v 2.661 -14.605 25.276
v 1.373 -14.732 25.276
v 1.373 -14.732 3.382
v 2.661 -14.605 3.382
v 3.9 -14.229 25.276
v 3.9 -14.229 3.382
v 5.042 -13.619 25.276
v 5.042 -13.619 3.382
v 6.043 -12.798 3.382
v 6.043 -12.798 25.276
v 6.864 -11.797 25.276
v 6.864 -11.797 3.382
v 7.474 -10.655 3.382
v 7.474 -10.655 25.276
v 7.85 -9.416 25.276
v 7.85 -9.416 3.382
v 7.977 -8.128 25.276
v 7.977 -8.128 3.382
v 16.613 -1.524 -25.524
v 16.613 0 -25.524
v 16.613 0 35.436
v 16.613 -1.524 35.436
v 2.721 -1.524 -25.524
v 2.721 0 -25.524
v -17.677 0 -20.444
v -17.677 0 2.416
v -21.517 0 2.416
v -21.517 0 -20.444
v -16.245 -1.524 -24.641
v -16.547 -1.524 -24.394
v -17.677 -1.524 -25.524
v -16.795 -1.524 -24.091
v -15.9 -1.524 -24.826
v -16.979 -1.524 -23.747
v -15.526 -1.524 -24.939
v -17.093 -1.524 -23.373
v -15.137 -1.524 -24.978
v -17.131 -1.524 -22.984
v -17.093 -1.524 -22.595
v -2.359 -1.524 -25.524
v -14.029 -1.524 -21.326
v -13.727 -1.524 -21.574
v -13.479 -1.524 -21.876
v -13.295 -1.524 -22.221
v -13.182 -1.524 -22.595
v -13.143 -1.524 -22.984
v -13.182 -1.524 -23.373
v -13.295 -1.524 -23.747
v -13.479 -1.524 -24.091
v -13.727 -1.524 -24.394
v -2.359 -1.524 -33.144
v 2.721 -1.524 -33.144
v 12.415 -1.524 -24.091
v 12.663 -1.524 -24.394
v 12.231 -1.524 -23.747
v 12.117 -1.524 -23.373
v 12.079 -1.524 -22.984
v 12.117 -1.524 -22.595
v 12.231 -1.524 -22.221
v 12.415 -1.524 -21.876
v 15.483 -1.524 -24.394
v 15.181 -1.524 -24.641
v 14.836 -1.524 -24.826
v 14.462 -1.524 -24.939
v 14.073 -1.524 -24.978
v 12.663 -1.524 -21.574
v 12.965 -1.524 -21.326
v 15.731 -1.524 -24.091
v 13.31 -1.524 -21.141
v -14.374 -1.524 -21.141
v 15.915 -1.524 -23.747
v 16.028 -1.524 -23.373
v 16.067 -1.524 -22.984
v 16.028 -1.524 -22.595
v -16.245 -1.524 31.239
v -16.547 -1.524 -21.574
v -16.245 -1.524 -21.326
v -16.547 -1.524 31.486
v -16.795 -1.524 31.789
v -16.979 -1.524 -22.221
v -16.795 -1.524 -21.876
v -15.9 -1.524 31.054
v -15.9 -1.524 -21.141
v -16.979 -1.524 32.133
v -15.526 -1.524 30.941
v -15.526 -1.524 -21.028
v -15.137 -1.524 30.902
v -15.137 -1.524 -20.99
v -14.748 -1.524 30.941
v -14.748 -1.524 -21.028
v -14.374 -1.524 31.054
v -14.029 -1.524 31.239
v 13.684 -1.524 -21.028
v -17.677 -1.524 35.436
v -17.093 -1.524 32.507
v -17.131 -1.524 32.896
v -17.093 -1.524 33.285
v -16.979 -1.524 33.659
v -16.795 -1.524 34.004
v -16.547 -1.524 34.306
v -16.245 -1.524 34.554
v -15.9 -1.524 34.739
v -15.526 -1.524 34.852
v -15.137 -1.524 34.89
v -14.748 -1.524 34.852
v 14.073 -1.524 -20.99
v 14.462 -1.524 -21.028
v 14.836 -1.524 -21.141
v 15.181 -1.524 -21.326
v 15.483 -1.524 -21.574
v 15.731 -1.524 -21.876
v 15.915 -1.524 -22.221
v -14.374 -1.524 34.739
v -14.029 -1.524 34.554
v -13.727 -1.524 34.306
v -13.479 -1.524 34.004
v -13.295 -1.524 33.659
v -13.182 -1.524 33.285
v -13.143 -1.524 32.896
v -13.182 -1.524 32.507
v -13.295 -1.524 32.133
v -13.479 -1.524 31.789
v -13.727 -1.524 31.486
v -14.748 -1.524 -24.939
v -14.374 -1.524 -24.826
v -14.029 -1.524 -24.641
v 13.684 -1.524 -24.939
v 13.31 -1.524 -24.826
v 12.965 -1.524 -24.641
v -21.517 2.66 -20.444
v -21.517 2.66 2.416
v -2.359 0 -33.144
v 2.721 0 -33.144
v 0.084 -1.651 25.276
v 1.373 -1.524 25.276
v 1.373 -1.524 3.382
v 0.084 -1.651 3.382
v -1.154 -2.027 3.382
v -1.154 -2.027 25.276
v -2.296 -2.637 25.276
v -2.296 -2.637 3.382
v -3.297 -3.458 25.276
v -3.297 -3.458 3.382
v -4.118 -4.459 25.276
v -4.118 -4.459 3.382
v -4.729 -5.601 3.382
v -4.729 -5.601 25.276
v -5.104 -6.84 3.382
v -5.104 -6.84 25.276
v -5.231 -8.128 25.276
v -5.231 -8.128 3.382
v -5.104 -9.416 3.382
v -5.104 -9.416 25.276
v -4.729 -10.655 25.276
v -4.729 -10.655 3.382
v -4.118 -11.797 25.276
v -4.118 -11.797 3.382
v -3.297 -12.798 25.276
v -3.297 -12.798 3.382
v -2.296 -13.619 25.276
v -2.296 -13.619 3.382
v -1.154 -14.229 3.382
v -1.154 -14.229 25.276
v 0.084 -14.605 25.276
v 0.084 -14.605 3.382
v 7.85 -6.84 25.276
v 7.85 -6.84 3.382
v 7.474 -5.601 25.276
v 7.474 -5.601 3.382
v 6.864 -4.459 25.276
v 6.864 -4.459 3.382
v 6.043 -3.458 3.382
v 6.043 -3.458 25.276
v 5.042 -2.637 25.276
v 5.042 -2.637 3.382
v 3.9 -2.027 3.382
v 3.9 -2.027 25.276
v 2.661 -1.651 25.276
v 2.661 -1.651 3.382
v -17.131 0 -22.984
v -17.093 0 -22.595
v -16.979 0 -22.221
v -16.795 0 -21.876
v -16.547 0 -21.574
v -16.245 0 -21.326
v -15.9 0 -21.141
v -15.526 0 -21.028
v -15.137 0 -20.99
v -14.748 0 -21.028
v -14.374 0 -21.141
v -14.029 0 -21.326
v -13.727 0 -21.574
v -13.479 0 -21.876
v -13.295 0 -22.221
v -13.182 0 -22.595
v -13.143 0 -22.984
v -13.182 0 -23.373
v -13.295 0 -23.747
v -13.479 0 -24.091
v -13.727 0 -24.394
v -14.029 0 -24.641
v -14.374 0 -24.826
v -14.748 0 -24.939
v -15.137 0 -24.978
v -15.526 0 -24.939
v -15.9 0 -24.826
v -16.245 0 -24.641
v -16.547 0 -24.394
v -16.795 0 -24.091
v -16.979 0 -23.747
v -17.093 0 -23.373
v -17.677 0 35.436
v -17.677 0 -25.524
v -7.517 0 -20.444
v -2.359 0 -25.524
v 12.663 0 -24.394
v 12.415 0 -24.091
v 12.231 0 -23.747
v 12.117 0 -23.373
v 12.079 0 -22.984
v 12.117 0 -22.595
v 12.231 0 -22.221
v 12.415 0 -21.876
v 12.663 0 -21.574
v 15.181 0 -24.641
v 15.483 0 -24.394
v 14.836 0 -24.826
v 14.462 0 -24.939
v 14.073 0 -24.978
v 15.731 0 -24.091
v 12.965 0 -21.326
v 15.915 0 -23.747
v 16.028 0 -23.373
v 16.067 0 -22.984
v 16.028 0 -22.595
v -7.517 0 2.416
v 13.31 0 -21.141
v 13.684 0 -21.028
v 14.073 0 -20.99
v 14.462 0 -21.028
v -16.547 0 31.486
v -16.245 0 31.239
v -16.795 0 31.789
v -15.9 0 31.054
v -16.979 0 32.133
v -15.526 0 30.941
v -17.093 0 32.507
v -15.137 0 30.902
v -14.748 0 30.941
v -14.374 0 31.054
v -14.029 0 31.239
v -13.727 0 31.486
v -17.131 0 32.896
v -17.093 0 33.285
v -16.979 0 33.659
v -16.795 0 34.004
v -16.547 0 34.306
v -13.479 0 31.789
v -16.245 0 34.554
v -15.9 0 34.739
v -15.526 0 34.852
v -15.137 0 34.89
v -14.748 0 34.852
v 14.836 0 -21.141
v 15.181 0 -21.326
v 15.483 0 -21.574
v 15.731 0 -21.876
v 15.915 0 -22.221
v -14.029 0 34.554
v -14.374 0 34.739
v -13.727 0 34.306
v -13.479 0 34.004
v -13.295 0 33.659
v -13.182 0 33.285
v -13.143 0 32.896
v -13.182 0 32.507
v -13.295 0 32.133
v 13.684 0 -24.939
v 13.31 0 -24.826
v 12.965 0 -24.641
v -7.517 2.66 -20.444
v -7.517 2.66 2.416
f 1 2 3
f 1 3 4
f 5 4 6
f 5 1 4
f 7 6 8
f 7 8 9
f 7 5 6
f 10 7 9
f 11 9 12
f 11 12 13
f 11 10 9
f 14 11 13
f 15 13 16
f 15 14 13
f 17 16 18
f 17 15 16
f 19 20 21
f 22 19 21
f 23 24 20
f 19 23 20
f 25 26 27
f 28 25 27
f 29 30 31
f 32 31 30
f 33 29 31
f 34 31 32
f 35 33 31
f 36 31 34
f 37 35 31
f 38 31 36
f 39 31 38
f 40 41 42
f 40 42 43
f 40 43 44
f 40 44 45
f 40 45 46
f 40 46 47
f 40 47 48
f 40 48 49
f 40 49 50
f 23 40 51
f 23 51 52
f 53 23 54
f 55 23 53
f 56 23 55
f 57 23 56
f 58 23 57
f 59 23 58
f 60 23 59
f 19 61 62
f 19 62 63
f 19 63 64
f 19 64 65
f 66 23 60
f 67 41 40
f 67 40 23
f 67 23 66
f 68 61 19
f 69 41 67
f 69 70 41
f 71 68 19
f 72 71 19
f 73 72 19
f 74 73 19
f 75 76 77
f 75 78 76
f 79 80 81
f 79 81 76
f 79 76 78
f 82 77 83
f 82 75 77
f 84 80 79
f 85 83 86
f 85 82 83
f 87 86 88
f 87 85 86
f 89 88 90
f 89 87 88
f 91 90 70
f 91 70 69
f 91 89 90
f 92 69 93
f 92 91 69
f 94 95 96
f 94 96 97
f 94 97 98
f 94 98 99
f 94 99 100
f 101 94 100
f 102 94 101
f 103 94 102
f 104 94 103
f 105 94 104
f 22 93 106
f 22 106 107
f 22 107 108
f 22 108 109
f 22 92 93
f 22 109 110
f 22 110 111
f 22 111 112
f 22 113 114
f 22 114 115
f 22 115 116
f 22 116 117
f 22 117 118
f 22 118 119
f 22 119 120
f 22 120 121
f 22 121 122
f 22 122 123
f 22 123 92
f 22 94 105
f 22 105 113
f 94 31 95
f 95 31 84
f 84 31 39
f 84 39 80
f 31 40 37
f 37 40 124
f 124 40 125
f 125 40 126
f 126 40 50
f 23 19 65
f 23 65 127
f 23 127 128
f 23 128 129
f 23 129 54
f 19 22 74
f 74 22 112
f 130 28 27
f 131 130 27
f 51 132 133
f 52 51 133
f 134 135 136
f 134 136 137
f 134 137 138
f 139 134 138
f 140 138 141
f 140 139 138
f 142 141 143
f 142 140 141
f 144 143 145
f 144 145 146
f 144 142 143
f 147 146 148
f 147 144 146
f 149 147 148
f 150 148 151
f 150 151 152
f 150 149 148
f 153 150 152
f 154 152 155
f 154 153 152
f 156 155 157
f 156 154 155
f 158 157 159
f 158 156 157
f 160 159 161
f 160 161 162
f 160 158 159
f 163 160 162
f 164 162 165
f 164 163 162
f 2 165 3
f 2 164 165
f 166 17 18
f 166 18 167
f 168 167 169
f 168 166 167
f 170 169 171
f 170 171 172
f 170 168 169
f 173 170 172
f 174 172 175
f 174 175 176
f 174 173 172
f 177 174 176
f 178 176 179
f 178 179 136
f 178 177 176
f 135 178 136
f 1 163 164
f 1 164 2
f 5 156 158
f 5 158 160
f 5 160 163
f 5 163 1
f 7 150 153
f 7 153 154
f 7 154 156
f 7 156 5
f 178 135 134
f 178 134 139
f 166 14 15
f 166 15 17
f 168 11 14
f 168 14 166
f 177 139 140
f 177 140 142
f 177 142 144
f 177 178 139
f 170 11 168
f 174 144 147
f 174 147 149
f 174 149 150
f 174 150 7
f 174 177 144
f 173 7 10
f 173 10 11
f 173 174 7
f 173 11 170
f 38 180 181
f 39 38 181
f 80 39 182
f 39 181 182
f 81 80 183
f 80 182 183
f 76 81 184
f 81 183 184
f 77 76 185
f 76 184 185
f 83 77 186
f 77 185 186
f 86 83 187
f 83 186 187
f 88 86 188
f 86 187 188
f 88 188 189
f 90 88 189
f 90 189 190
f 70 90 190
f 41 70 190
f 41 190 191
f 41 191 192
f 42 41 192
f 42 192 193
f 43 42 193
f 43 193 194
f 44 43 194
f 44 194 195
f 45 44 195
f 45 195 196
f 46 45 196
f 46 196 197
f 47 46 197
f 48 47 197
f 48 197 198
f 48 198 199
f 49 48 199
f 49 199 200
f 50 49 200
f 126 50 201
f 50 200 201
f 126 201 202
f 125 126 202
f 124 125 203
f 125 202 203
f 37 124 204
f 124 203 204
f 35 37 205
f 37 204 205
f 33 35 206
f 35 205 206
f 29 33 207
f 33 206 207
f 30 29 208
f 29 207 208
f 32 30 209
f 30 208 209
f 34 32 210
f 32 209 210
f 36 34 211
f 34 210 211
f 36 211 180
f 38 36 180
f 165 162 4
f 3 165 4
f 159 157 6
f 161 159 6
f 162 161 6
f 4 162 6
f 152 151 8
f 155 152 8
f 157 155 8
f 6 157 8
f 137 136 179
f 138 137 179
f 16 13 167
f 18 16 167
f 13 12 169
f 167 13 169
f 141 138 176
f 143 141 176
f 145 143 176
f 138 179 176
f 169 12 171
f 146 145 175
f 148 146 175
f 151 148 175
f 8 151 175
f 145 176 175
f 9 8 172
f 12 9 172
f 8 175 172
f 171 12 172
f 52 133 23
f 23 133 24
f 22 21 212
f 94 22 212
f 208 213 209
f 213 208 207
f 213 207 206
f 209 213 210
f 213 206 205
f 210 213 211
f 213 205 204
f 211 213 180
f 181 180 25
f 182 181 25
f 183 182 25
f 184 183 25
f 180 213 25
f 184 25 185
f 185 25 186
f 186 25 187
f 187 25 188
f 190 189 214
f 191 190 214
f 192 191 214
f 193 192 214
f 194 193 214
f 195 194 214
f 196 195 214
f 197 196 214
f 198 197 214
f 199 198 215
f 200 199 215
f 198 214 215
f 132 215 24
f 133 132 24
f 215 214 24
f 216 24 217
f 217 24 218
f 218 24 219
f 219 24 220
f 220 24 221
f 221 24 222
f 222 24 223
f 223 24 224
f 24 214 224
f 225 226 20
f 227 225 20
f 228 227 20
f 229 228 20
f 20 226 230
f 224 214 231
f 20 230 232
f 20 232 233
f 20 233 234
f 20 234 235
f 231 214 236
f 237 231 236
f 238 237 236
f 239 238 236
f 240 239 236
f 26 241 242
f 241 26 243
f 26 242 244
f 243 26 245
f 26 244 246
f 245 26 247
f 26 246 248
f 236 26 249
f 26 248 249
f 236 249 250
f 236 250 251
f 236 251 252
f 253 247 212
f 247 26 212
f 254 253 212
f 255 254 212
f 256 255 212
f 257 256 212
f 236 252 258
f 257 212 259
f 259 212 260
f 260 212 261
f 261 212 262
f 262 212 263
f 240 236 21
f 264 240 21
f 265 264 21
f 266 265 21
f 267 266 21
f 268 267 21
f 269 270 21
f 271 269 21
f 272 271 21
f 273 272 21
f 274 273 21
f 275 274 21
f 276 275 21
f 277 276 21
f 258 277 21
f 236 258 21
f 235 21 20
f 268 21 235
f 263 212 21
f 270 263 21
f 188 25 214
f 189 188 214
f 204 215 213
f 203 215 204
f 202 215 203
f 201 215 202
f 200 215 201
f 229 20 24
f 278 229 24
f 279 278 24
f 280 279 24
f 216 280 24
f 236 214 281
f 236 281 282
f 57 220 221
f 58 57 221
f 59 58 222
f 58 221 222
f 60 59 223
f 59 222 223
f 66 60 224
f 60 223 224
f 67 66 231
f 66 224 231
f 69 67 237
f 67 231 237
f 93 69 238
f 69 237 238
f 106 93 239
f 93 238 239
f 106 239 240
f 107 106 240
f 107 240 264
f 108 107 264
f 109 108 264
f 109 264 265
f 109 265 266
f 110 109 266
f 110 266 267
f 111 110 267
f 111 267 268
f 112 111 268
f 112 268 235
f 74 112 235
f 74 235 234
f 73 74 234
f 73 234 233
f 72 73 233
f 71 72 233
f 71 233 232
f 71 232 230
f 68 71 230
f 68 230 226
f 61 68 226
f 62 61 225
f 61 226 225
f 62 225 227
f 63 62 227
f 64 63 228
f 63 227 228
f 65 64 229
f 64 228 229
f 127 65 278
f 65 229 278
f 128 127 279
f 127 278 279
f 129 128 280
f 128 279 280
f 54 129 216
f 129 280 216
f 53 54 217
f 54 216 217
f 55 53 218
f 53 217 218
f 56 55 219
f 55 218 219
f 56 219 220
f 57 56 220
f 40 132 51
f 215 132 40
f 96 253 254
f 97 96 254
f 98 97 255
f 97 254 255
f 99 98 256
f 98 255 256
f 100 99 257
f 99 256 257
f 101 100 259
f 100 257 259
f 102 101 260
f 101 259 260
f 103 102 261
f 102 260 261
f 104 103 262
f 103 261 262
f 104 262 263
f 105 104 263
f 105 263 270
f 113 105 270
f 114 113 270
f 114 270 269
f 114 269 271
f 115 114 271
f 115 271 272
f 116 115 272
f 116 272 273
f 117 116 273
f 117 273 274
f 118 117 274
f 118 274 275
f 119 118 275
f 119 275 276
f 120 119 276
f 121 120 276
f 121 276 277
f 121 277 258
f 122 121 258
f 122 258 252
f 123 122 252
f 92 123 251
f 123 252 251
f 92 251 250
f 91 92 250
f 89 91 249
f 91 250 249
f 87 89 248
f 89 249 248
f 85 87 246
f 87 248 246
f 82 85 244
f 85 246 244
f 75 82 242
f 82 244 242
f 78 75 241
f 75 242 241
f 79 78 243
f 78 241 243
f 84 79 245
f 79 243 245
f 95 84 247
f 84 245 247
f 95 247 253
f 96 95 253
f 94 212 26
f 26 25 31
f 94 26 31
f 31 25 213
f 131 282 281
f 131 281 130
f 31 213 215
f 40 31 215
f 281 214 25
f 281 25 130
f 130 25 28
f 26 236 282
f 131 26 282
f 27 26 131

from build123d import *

# Parameters (mm, degrees)
F0_W     = 5.08
F0_H     = 7.62
F1_DEPTH = 1.524
F2_W     = 14
F2_H     = 22.86
F3_DEPTH = 2.66
F6_DEPTH = 21.8948
F7_R     = 1.9939
F8_DEPTH = 14.733


with BuildPart() as f1:
    # F0 (on Front) → F1 (new body)
    with BuildSketch(Plane.XZ):
        Polygon((16.6127808136, 35.4363795967), (-17.6772191864, 35.4363795967), (-17.6772191864, -25.5236204033), (-2.3591062054, -25.5236204033), (2.7208937946, -25.5236204033), (16.6127808136, -25.5236204033), align=None)
        with Locations((0.1808937946, -29.3336204033)):
            Rectangle(F0_W, F0_H)
    extrude(amount=F1_DEPTH)

    # F2 (on face) → F3 (join)
    with BuildSketch(Plane(origin=(0, 0, 0), x_dir=(-1, 0, 0), z_dir=(0, 1, 0))):
        with Locations((14.5172191864, -9.0136204033)):
            Rectangle(F2_W, F2_H)
    extrude(amount=F3_DEPTH)

    # F7 (on face) → F8 (cut, through all)
    with BuildSketch(Plane(origin=(0, 0, 0), x_dir=(-1, 0, 0), z_dir=(0, 1, 0))):
        with Locations((15.1372191864, 32.8963795967)):
            Circle(F7_R)
        with Locations((15.1372191864, -22.9836204033)):
            Circle(F7_R)
        with Locations((-14.0727808136, -22.9836204033)):
            Circle(F7_R)
    extrude(amount=-F8_DEPTH, mode=Mode.SUBTRACT)


with BuildPart() as f6:
    # F5 (on offset) → F6 (new body)
    with BuildSketch(Plane.XY.offset(25.2763795967)):
        with BuildLine():
            ThreePointArc((7.9767808136, -8.128), (6.0425139965, -3.458266817), (1.3727808136, -1.524))
            Line((1.3727808136, -1.524), (1.3727808136, -14.732))
            ThreePointArc((1.3727808136, -14.732), (6.0425139965, -12.797733183), (7.9767808136, -8.128))
        make_face()
        with BuildLine():
            Line((1.3727808136, -14.732), (1.3727808136, -1.524))
            ThreePointArc((1.3727808136, -1.524), (-5.2312191864, -8.128), (1.3727808136, -14.732))
        make_face()
    extrude(amount=-F6_DEPTH)


solid = Compound([f1.part, f6.part])
